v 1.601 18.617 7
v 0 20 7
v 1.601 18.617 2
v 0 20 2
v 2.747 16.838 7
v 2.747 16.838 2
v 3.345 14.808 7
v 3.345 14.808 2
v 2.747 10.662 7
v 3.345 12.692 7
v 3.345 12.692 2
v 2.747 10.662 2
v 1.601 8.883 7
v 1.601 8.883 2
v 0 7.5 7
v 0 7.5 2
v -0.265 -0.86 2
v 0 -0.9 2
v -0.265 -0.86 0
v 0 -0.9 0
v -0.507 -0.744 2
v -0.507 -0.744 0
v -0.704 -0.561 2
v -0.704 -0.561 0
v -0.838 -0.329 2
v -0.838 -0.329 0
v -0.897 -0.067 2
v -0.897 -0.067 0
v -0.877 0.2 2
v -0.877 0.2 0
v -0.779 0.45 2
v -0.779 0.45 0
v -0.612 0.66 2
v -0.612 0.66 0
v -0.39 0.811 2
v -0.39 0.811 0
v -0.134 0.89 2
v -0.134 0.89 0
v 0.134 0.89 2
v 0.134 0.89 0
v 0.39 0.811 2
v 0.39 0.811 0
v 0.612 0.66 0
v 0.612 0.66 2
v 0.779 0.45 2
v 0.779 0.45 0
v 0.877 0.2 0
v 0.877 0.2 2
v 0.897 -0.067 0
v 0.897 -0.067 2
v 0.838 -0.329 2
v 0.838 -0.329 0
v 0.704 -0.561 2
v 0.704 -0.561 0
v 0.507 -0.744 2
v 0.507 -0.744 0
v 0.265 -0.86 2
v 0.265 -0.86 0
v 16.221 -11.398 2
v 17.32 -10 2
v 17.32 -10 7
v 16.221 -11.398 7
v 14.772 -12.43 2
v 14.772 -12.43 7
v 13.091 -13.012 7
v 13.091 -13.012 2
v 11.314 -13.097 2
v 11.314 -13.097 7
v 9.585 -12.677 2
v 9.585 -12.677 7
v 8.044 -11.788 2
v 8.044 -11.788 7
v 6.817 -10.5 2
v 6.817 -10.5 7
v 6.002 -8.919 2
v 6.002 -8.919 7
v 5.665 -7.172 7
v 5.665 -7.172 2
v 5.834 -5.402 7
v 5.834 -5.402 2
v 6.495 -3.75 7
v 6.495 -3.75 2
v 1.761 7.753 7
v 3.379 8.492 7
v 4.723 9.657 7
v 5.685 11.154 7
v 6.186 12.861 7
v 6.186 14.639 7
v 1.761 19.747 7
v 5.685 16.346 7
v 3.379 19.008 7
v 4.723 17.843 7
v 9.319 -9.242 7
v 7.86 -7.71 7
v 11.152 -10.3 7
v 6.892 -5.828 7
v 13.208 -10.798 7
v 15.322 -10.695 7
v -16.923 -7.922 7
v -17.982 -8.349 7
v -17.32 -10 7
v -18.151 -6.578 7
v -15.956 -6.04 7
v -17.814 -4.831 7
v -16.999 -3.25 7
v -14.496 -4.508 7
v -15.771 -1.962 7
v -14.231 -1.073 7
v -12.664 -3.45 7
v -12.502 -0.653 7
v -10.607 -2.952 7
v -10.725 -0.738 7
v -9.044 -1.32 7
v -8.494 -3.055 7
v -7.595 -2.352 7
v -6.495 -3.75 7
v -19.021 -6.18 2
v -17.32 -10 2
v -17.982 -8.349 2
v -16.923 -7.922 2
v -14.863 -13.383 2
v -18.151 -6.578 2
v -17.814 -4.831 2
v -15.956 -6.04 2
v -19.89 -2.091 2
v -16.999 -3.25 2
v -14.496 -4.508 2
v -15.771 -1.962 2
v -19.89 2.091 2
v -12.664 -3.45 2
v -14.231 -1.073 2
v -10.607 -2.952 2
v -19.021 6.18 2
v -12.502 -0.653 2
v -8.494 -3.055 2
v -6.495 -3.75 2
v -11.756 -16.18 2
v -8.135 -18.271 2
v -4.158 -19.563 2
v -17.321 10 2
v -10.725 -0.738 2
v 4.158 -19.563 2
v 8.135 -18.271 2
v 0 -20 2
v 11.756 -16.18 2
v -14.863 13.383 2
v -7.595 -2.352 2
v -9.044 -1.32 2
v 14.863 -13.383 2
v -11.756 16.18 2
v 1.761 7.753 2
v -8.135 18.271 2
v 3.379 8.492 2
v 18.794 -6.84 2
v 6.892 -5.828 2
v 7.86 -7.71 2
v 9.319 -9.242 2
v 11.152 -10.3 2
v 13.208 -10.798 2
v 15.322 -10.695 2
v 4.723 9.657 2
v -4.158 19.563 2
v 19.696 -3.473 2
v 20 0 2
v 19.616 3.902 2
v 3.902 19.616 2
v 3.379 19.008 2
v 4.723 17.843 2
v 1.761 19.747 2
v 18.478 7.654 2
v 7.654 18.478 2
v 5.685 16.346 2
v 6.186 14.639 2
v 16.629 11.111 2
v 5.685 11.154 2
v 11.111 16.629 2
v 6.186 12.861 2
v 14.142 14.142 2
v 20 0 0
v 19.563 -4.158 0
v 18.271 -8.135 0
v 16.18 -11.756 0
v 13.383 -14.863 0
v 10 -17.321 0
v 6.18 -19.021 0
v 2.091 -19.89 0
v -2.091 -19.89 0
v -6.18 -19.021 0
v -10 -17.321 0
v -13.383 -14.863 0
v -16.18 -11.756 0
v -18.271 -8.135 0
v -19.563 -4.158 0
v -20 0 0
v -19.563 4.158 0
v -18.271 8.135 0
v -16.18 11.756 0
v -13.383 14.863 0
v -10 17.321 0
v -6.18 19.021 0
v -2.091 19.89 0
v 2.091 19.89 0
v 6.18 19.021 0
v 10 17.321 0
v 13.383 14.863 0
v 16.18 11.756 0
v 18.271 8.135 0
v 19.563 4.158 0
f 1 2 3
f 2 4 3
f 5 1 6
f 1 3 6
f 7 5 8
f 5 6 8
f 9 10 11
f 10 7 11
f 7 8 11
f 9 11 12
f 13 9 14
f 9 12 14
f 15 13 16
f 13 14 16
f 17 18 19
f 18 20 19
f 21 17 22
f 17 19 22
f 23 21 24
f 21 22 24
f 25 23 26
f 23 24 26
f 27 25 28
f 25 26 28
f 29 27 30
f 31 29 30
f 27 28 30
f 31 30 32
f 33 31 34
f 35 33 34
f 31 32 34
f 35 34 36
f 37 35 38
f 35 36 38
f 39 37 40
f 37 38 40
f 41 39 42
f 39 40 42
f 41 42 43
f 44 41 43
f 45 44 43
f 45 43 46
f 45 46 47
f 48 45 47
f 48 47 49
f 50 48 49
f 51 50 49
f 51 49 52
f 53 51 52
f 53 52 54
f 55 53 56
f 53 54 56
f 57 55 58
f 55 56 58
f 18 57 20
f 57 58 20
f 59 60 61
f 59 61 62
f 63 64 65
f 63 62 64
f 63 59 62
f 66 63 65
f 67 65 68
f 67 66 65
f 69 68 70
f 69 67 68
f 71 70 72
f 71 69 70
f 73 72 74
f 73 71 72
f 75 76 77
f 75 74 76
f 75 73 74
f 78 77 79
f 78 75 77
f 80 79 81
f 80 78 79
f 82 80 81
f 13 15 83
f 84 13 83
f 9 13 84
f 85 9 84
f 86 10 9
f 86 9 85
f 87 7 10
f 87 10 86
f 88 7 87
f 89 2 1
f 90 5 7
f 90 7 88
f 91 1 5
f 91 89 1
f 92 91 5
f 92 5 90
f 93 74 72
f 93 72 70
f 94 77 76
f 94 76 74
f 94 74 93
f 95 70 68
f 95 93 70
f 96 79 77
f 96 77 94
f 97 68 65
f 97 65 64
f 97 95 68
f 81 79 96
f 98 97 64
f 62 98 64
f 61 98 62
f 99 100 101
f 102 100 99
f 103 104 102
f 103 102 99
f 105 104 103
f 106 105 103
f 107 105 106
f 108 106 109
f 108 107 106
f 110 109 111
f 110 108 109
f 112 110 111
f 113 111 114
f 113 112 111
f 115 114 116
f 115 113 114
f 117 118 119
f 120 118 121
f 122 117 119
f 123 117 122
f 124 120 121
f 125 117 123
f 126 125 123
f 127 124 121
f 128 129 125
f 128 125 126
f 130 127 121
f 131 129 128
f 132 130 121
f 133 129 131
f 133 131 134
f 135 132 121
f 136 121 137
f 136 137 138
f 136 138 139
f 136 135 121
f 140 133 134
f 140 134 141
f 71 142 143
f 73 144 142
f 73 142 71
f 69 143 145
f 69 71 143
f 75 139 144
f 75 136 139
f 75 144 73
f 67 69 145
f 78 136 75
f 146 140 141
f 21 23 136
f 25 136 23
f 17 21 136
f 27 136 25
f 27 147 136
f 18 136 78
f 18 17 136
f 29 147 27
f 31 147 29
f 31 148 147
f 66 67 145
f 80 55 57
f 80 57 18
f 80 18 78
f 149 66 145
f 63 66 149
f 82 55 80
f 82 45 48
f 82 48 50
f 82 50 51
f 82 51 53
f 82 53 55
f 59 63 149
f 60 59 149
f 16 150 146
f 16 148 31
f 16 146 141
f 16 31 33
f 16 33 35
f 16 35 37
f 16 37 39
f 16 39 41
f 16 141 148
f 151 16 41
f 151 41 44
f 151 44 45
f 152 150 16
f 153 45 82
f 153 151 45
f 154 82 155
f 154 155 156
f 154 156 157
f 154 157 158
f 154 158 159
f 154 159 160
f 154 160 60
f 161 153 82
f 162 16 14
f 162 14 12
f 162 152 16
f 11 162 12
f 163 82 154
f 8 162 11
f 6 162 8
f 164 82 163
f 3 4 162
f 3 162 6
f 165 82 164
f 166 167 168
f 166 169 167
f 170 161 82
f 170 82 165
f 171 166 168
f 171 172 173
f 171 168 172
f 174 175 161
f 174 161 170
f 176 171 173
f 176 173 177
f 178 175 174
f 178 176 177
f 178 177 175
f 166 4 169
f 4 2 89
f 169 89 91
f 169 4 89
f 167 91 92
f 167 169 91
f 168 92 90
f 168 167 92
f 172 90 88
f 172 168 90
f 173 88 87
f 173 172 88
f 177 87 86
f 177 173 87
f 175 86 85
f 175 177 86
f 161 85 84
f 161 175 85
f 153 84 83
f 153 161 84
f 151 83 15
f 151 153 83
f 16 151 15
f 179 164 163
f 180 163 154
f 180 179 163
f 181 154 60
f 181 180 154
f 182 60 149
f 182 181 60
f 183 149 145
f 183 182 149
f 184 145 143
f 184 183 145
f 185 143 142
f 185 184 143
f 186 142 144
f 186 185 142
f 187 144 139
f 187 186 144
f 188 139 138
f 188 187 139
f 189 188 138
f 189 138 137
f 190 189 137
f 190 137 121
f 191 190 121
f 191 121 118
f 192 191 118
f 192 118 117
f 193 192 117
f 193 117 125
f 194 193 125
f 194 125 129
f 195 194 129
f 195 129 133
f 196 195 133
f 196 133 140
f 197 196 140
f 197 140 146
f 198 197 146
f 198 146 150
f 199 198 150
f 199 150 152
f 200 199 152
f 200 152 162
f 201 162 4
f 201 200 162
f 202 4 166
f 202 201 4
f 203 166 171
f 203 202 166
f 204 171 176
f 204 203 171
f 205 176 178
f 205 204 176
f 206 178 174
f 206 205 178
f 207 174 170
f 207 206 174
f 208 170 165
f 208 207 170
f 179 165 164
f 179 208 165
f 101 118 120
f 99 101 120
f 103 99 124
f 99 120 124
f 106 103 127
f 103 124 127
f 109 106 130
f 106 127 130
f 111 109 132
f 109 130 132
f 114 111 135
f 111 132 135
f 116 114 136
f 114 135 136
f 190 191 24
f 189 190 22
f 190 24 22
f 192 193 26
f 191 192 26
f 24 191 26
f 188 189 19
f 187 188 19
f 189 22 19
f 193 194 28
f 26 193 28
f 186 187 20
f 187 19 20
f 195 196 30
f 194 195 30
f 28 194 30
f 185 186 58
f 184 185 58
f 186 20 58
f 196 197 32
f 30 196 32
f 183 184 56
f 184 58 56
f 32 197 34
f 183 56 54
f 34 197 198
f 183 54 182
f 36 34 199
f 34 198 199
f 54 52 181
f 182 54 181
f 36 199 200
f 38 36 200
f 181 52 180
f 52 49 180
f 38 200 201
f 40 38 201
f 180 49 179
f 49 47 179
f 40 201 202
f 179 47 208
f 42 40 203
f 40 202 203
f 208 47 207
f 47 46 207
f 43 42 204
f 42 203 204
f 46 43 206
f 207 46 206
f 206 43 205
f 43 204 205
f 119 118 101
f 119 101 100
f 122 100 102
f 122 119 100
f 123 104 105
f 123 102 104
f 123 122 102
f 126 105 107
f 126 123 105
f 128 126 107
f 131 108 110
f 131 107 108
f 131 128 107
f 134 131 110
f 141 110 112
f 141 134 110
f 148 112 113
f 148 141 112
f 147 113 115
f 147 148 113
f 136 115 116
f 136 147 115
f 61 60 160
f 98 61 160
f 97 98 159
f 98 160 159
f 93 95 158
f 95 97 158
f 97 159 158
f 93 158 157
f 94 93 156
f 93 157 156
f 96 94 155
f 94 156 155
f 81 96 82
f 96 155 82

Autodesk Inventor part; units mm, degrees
ref_plane "YZ Plane" through (0, 0, 0) normal (1, 0, 0) x (0, 1, 0)
ref_plane "XZ Plane" through (0, 0, 0) normal (0, 1, 0) x (-1, 0, 0)
ref_plane "XY Plane" through (0, 0, 0) normal (0, 0, 1) x (1, 0, 0)
sketch "スケッチ1" plane through (0, 0, 0) normal (0, 0, 1) x (1, 0, 0)
  circle A0 centre (0, 0) radius 20
  dimension "d0" = 40
extrude "押し出し1" add sketch "スケッチ1" along normal blind 2
sketch "スケッチ2" plane through (0, 0, 2) normal (0, 0, 1) x (1, 0, 0)
  circle A0 centre (0, 0) radius 7.5
  circle A1 centre (0, 0) radius 20 projected
  arc A2 (0, 7.5) -> (0, 20) centre (0, 13.75) ccw
  arc A3 (0, 7.5) -> (0, 20) centre (-4, 13.75) ccw
  arc A4 (-6.4952, -3.75) -> (-17.3205, -10) centre (-11.9078, -6.875) ccw
  arc A5 (-6.4952, -3.75) -> (-17.3205, -10) centre (-9.9078, -10.3391) ccw
  arc A6 (6.4952, -3.75) -> (17.3205, -10) centre (11.9078, -6.875) ccw
  arc A7 (6.4952, -3.75) -> (17.3205, -10) centre (13.9078, -3.4109) ccw
  dimension "d3" = 15
  dimension "d4" = 4
  dimension "d20" = 360
extrude "押し出し2" add sketch "スケッチ2" along normal blind 5 contours A3 A2 | A7 A6 | A5 A4
sketch "スケッチ3" plane through (0, 0, 2) normal (0, 0, 1) x (1, 0, 0)
  point P0 (0, 0)
  point P1 (0, 0)
hole "穴1" at (0, 0, 2) direction (0, 0, -1) diameter 1.8 depth 8.8 tip angle 118
properties part number "20220618_ファン40mm羽数12枚2mm"
